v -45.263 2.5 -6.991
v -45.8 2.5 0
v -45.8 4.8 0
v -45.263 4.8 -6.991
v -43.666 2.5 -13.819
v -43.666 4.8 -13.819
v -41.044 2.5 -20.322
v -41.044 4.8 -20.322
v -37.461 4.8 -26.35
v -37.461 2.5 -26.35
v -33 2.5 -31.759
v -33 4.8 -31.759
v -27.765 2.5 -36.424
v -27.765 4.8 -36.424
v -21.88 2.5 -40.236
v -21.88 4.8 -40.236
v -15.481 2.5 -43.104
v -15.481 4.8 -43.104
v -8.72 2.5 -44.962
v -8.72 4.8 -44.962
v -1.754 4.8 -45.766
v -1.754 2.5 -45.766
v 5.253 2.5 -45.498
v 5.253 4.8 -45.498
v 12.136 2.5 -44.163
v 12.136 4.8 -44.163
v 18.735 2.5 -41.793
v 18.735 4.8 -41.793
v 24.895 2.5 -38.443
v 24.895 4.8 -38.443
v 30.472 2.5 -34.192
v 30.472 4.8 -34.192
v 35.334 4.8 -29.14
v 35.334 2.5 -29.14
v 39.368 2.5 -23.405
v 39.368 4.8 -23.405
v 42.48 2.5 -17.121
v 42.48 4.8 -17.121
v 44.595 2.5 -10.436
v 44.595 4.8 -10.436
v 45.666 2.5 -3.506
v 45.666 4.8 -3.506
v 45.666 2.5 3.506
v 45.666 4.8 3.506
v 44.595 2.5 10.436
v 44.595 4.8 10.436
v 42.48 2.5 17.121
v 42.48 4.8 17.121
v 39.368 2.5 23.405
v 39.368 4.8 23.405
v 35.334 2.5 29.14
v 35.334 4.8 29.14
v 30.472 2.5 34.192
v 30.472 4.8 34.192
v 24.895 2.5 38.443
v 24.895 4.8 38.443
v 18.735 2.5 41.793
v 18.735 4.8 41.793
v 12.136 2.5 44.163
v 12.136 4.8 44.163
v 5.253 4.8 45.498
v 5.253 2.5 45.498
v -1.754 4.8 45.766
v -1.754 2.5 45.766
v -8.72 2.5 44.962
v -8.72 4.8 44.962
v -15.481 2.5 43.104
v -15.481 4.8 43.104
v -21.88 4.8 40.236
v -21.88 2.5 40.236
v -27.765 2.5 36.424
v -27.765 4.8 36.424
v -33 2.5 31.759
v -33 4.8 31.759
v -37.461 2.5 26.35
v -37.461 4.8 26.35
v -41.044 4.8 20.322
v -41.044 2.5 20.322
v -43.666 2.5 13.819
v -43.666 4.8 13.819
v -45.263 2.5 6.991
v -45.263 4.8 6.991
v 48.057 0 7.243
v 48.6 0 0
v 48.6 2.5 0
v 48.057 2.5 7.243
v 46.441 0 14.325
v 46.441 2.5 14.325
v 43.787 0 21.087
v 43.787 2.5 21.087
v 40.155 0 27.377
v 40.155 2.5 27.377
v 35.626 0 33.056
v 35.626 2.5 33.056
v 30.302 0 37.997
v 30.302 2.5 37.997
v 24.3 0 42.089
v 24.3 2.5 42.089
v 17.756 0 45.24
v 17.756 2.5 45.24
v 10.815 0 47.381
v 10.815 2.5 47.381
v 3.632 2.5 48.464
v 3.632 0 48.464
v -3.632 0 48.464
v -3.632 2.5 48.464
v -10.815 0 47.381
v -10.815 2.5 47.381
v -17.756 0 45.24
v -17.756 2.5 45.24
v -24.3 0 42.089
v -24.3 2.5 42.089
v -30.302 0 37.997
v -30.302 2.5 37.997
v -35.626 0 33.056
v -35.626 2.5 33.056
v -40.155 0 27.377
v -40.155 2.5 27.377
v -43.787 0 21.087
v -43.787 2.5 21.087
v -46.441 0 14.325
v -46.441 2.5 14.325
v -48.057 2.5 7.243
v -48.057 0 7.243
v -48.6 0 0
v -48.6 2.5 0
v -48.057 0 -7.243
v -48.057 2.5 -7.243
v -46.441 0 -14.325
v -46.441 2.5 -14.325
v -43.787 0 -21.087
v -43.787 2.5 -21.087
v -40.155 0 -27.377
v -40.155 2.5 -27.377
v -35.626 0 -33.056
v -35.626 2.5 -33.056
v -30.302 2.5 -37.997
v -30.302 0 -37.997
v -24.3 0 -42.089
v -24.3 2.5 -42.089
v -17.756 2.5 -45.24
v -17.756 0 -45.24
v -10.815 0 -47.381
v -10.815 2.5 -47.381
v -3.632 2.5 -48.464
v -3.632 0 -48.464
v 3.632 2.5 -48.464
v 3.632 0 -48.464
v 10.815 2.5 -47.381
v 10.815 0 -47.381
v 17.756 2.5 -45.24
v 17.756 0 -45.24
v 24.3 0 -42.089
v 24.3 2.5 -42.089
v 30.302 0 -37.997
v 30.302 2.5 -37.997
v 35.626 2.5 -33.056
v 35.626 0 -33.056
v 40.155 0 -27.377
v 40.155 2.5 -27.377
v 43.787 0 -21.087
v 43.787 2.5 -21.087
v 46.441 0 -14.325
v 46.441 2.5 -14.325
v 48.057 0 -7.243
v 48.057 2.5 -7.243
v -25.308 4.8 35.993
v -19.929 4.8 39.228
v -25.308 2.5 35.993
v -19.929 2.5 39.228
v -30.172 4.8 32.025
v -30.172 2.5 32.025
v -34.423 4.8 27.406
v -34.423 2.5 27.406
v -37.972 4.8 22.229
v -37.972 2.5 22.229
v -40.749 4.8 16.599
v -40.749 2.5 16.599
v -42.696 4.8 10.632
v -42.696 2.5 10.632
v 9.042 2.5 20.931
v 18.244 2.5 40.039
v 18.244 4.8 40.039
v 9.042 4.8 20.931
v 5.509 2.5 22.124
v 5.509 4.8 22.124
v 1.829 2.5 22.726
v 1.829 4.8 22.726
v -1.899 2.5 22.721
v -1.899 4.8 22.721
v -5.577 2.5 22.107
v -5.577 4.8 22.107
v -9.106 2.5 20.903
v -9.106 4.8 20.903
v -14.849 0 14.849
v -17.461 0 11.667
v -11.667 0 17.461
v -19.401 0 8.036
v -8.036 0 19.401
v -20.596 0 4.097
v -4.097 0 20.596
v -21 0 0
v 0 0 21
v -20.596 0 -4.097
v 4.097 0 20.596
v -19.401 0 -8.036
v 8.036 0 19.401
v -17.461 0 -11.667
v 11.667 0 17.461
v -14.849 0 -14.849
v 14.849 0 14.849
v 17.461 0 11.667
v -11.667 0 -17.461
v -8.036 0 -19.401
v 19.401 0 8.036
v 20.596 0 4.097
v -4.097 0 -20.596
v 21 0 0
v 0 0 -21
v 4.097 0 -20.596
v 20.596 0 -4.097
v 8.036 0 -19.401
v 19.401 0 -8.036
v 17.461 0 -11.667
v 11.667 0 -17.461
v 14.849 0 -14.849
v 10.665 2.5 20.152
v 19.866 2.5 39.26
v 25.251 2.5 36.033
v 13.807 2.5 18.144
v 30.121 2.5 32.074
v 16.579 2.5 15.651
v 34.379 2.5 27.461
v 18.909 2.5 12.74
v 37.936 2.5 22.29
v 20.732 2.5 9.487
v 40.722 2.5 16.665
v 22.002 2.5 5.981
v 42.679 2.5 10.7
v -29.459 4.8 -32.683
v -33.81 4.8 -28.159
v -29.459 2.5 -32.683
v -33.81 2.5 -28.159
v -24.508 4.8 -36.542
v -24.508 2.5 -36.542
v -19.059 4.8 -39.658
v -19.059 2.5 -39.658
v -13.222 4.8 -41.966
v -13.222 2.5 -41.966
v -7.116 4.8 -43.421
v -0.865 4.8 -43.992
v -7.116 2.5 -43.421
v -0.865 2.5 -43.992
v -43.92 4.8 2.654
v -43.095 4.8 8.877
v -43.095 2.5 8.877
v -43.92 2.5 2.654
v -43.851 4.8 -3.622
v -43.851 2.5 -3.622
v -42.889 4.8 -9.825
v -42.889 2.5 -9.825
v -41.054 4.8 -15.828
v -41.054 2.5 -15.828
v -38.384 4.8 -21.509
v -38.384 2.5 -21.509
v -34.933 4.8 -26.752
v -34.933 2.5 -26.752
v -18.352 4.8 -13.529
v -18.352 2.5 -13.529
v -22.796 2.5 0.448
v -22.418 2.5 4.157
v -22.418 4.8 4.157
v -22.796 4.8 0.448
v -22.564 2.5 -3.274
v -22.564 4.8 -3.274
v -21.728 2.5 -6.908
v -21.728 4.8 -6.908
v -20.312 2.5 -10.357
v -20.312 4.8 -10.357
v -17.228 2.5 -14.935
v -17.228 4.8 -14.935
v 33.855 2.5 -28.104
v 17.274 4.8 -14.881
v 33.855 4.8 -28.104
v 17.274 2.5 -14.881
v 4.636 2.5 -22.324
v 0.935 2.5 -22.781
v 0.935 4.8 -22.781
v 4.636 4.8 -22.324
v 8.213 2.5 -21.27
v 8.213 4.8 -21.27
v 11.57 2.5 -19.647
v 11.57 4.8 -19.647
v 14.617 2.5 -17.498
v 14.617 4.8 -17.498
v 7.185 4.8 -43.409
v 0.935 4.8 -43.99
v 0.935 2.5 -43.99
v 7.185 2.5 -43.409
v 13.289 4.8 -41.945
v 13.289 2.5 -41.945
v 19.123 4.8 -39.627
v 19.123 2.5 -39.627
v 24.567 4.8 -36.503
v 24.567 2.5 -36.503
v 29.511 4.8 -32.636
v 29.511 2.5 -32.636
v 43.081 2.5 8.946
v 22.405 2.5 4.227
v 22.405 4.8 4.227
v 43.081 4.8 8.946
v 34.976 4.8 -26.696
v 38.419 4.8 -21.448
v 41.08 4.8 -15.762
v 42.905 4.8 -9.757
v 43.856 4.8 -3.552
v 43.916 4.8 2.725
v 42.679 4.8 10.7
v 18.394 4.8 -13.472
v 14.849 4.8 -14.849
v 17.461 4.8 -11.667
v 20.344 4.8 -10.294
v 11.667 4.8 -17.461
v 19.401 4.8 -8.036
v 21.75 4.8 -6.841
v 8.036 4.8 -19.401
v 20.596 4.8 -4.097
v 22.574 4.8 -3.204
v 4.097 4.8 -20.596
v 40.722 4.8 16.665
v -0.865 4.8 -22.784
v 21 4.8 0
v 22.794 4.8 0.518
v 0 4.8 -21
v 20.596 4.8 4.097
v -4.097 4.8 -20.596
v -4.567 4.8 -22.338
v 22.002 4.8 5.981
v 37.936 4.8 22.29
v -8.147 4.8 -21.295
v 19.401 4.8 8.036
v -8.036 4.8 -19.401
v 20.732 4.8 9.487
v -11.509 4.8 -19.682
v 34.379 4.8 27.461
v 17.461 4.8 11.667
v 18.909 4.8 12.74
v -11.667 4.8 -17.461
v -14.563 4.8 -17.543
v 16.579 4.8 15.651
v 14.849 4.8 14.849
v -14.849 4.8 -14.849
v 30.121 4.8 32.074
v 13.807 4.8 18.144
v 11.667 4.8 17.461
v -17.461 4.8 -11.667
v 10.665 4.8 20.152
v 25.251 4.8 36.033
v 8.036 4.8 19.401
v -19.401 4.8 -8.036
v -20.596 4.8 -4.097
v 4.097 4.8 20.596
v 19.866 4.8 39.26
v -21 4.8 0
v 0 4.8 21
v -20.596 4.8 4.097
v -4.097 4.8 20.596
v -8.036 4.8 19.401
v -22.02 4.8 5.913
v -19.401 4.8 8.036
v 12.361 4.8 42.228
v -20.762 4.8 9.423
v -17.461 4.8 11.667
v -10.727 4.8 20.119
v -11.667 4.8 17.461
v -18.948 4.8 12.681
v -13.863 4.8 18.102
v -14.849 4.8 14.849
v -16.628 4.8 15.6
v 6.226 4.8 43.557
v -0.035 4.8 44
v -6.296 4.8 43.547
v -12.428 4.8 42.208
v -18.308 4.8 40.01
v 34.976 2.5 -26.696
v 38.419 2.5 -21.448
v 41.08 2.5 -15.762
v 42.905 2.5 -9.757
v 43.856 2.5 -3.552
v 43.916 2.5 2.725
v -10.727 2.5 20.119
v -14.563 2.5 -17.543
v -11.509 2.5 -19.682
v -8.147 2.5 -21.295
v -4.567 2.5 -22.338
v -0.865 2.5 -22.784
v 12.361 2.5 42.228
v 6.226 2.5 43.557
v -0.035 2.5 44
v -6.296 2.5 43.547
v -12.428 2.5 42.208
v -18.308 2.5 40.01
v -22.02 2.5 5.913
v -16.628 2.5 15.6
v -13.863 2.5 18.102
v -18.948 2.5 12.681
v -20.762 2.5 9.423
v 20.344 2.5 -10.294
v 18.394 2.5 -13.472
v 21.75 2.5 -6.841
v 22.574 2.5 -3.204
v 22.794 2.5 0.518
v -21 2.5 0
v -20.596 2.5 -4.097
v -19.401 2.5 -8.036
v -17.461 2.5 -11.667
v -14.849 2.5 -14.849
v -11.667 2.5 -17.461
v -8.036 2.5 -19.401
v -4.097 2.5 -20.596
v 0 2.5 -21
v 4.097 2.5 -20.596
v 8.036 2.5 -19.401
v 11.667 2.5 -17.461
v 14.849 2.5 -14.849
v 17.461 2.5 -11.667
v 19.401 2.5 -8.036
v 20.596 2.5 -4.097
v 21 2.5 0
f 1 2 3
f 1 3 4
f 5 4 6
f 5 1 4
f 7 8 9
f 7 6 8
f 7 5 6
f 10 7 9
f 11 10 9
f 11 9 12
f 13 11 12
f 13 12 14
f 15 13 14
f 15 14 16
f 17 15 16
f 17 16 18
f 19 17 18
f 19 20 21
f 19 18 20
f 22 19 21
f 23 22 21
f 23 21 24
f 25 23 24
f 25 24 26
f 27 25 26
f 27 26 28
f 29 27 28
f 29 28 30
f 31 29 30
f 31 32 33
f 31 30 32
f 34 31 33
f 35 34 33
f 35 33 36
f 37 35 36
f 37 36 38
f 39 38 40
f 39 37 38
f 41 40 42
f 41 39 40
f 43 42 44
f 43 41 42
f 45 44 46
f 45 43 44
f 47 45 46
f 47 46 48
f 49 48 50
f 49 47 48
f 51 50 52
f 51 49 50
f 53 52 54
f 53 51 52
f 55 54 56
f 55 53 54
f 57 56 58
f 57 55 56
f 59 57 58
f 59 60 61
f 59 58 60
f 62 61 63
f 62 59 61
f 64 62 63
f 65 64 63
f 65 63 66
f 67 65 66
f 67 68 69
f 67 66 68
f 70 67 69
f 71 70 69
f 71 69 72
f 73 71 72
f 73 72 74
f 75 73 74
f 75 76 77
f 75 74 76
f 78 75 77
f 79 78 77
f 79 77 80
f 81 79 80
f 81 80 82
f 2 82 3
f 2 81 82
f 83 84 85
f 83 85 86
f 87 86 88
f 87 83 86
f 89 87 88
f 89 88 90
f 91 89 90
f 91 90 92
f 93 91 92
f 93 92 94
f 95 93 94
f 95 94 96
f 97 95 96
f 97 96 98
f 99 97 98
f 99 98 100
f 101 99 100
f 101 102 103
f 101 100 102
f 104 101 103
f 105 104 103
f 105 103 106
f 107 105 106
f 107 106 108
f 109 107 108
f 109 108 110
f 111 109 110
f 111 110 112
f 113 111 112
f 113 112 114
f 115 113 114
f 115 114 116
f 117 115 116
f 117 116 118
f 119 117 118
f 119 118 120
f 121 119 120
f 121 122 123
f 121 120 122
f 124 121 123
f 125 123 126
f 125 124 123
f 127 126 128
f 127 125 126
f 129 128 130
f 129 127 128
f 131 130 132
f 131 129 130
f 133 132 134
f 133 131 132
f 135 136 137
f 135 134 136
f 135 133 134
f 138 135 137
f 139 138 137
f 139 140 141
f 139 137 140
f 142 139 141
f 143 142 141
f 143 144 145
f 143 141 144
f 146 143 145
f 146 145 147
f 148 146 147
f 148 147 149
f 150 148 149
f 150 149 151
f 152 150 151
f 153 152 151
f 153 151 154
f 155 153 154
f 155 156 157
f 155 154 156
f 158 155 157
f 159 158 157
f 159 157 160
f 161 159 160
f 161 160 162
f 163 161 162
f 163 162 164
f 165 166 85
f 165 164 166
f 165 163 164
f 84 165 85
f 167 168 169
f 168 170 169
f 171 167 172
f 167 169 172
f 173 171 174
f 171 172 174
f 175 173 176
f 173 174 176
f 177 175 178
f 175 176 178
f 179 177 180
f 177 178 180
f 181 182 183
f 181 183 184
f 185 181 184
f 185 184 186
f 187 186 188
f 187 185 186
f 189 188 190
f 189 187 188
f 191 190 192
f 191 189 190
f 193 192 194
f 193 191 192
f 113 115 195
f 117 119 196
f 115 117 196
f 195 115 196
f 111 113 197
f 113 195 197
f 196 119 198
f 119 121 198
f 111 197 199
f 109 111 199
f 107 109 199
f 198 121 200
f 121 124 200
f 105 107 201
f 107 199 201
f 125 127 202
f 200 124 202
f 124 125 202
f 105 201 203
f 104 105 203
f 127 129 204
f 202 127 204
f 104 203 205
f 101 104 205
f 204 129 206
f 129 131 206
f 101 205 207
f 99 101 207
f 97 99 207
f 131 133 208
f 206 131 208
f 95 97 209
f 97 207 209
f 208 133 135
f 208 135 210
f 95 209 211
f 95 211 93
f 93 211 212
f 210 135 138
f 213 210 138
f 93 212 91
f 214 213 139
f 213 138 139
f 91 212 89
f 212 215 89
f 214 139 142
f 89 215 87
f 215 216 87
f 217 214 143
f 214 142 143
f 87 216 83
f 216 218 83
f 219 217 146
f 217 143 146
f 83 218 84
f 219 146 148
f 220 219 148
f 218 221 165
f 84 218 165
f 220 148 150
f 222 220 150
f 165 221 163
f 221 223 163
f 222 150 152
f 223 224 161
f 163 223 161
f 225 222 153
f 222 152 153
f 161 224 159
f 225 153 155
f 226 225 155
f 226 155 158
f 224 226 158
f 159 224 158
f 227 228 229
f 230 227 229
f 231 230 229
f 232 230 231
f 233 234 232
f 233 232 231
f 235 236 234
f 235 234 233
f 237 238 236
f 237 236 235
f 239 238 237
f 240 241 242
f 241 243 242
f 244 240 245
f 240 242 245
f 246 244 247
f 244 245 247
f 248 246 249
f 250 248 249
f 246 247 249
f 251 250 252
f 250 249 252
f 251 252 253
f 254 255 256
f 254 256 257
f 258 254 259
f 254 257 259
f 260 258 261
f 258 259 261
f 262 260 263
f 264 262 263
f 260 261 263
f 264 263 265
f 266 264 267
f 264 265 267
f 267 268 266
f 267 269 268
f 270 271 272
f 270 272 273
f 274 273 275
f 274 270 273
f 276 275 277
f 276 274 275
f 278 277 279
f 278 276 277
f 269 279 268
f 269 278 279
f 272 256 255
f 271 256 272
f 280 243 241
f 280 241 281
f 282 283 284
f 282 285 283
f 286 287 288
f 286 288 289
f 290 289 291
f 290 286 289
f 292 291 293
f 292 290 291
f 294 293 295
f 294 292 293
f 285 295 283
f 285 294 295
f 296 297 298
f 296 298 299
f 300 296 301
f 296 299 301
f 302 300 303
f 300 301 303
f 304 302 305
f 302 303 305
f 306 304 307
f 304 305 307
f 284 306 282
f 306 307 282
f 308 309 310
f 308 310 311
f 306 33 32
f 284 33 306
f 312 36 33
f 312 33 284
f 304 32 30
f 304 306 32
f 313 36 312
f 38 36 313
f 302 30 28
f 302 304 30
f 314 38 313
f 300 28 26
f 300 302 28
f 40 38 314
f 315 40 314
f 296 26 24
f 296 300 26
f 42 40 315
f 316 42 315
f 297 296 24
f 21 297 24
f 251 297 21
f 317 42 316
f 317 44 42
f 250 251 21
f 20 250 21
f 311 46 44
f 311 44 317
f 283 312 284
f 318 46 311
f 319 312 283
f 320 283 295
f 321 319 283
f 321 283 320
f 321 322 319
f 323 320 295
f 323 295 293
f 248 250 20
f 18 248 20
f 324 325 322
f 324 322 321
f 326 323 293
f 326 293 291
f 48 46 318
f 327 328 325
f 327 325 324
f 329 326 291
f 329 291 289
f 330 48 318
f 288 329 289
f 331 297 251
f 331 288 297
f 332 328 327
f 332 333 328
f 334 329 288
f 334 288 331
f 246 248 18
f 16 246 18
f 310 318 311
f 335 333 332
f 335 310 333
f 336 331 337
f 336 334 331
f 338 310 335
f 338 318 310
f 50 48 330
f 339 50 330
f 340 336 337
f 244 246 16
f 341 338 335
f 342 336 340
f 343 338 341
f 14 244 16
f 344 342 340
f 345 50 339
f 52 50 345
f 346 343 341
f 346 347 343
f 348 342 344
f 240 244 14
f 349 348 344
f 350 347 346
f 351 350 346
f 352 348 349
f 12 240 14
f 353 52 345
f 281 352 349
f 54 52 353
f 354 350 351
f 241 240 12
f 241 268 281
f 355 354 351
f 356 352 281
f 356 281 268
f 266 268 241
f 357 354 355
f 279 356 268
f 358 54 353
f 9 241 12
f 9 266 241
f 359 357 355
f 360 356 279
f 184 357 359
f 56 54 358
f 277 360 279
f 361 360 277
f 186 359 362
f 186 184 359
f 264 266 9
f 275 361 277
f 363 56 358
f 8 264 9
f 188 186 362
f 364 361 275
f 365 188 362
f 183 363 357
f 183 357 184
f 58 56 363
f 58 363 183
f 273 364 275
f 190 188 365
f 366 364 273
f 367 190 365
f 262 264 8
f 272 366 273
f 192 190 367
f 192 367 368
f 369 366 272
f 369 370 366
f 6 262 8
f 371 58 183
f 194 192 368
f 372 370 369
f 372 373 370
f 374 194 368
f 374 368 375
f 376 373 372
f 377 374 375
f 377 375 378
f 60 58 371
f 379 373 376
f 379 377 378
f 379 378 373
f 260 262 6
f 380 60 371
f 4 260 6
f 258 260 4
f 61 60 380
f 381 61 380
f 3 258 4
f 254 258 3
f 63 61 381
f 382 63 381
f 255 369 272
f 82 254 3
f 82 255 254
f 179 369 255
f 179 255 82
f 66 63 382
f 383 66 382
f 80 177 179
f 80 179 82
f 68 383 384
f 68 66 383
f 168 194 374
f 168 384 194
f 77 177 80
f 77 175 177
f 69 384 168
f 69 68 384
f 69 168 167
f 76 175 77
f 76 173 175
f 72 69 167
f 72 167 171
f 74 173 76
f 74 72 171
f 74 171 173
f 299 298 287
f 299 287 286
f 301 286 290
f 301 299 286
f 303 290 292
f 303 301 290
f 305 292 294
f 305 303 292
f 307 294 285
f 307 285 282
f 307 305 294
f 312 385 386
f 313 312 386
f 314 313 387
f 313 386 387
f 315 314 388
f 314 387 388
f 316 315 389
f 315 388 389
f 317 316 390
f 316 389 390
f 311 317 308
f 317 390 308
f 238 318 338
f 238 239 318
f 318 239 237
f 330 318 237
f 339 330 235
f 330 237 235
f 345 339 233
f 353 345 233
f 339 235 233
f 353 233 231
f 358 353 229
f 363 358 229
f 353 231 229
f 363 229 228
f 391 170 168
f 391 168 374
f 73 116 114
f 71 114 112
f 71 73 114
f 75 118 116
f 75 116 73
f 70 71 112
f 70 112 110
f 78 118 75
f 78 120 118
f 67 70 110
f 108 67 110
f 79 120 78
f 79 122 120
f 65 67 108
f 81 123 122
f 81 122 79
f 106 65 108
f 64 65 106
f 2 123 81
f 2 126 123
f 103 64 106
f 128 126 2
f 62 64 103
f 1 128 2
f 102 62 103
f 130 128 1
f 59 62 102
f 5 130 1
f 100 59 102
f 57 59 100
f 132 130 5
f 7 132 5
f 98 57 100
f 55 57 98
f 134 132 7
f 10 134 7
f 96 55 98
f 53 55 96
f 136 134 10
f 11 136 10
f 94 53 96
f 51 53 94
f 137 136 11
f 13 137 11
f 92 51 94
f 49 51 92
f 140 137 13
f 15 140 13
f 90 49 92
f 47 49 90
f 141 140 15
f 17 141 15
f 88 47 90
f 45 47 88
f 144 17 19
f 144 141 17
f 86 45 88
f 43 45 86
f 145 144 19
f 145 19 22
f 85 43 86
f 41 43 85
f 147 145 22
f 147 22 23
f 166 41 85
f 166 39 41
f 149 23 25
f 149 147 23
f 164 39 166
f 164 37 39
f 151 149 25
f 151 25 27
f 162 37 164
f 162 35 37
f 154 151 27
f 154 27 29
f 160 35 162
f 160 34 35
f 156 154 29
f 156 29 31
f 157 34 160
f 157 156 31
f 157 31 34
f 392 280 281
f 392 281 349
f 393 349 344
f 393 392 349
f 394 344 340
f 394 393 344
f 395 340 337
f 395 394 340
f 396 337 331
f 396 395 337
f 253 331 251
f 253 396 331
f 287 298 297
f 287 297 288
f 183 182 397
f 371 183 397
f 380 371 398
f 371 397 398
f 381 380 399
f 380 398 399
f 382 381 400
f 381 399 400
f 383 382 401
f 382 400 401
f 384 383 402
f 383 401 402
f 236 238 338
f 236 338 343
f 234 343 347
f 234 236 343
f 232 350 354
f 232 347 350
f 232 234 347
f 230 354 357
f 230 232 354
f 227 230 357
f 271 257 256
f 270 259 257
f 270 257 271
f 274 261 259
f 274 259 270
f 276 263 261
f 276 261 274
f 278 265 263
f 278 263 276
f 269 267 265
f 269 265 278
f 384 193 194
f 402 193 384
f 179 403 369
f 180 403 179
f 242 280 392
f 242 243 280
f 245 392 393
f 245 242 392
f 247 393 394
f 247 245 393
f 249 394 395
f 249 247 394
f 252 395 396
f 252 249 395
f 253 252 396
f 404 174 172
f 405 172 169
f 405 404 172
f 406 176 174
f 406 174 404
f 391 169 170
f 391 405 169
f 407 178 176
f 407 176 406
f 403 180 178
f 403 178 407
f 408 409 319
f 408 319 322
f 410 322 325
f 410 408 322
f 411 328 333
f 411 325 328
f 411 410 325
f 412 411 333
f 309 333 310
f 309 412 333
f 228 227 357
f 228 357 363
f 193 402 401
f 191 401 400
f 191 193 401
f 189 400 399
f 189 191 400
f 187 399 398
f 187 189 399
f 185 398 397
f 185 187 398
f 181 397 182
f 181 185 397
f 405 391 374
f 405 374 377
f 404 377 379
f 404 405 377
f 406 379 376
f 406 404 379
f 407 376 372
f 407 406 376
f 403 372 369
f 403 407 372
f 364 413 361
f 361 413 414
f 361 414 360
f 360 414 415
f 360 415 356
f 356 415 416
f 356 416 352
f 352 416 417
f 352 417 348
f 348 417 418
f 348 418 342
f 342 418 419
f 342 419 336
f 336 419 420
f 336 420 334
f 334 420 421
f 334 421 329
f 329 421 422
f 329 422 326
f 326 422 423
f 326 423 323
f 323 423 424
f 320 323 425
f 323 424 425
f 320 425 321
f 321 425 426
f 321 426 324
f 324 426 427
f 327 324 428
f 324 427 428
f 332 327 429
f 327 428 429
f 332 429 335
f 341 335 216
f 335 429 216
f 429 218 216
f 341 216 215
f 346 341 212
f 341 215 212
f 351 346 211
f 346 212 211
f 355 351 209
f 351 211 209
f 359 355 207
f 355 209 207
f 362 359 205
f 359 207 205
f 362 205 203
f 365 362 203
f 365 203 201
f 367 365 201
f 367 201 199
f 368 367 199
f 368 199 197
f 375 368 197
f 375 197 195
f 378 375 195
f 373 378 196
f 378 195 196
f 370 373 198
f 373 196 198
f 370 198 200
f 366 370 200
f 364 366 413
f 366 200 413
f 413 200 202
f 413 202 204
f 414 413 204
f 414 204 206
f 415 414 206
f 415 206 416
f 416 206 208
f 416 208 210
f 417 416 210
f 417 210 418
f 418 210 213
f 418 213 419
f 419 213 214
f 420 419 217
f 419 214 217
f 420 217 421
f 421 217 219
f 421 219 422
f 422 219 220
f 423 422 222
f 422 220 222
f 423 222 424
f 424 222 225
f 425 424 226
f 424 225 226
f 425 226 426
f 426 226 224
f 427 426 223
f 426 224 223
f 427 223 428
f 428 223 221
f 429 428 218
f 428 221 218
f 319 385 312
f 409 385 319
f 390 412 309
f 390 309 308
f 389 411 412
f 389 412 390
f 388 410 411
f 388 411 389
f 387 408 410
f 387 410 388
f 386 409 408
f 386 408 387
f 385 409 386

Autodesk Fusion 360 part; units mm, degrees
sketch "Sketch1" plane through (0, 0, 0) normal (0, 1, 0) x (1, 0, 0)
  circle A0 centre (0, 0) radius 48.6
  circle A1 centre (0, 0) radius 21
  dimension "d1" = 97.2
  dimension "d7" = 42
extrude "Extrude1" add sketch "Sketch1" along normal blind 2.5
sketch "support_ribs" plane through (0, 2.5, 0) normal (0, 1, 0) x (-1, 0, 0)
  circle A0 centre (0, 0) radius 21
  circle A1 centre (0, 0) radius 48.6
  circle A2 centre (0, 0) radius 45.8
  circle A3 centre (0, 0) radius 44
  circle A4 centre (0, 0) radius 21
  circle A5 centre (0, 0) radius 22.8
  line L0 (-0.9352, -21.9) -> (0.8648, -21.9)
  line L1 (0.8648, -21.9) -> (0.8648, -44.9)
  line L2 (0.8648, -44.9) -> (-0.9352, -44.9)
  line L3 (-0.9352, -44.9) -> (-0.9352, -21.9)
  line L4 (-0.9352, -21.9) -> (0.8648, -44.9) construction
  line L5 (0.8648, -21.9) -> (-0.9352, -44.9) construction
  dimension "d12" = 91.6
  dimension "d13" = 88
  dimension "d14" = 42
  dimension "d15" = 45.6
  dimension "d16" = 33.4
  dimension "d17" = 1.8
  dimension "d18" = 23
extrude "Extrude2" add sketch "support_ribs" along normal blind 2.3 contours A2 | A3 L1 L2 L3 | A5 L0 L1 L3 | A5 L0 L1 L3
extrude "Extrude3" add sketch "support_ribs" along normal blind 2.3 contours A3 A5 L1 L3 picked at (0.6649, -29.8579)
pattern_circular "C-Pattern1" count 7 over 360 about axis through (0, 1.75, 0) along (0, 1, 0) of "Extrude3"
equation "d1 = insert_dia"
equation "insert_dia = 97.2 mm"
equation "bit_dia = 30 mm"
equation "bit_clearance = 6 mm" comment "clearance between bit and insert"
equation "insert_thick = 2.5 mm"
equation "support_rib_height = 2.3 mm"
equation "d7 = bit_dia + bit_clearance * 2"
equation "d8 = insert_thick"
equation "insert_lip = 2.8 mm"
equation "support_rib_width = 1.8 mm"
equation "d12 = insert_dia - 2 * insert_lip"
equation "d13 = insert_dia - 2 * insert_lip - support_rib_width * 2"
equation "d14 = bit_dia + 2 * bit_clearance"
equation "d15 = bit_dia + 2 * bit_clearance + 2 * support_rib_width"
equation "d16 = ( insert_dia - 2 * insert_lip - ( bit_dia + 2 * bit_clearance ) ) / 4 + bit_dia / 2 + bit_clearance"
equation "d17 = support_rib_width"
equation "d18 = insert_dia / 2 - insert_lip - bit_dia / 2 - bit_clearance - support_rib_width"
equation "d19 = support_rib_height"
equation "d21 = support_rib_height"
